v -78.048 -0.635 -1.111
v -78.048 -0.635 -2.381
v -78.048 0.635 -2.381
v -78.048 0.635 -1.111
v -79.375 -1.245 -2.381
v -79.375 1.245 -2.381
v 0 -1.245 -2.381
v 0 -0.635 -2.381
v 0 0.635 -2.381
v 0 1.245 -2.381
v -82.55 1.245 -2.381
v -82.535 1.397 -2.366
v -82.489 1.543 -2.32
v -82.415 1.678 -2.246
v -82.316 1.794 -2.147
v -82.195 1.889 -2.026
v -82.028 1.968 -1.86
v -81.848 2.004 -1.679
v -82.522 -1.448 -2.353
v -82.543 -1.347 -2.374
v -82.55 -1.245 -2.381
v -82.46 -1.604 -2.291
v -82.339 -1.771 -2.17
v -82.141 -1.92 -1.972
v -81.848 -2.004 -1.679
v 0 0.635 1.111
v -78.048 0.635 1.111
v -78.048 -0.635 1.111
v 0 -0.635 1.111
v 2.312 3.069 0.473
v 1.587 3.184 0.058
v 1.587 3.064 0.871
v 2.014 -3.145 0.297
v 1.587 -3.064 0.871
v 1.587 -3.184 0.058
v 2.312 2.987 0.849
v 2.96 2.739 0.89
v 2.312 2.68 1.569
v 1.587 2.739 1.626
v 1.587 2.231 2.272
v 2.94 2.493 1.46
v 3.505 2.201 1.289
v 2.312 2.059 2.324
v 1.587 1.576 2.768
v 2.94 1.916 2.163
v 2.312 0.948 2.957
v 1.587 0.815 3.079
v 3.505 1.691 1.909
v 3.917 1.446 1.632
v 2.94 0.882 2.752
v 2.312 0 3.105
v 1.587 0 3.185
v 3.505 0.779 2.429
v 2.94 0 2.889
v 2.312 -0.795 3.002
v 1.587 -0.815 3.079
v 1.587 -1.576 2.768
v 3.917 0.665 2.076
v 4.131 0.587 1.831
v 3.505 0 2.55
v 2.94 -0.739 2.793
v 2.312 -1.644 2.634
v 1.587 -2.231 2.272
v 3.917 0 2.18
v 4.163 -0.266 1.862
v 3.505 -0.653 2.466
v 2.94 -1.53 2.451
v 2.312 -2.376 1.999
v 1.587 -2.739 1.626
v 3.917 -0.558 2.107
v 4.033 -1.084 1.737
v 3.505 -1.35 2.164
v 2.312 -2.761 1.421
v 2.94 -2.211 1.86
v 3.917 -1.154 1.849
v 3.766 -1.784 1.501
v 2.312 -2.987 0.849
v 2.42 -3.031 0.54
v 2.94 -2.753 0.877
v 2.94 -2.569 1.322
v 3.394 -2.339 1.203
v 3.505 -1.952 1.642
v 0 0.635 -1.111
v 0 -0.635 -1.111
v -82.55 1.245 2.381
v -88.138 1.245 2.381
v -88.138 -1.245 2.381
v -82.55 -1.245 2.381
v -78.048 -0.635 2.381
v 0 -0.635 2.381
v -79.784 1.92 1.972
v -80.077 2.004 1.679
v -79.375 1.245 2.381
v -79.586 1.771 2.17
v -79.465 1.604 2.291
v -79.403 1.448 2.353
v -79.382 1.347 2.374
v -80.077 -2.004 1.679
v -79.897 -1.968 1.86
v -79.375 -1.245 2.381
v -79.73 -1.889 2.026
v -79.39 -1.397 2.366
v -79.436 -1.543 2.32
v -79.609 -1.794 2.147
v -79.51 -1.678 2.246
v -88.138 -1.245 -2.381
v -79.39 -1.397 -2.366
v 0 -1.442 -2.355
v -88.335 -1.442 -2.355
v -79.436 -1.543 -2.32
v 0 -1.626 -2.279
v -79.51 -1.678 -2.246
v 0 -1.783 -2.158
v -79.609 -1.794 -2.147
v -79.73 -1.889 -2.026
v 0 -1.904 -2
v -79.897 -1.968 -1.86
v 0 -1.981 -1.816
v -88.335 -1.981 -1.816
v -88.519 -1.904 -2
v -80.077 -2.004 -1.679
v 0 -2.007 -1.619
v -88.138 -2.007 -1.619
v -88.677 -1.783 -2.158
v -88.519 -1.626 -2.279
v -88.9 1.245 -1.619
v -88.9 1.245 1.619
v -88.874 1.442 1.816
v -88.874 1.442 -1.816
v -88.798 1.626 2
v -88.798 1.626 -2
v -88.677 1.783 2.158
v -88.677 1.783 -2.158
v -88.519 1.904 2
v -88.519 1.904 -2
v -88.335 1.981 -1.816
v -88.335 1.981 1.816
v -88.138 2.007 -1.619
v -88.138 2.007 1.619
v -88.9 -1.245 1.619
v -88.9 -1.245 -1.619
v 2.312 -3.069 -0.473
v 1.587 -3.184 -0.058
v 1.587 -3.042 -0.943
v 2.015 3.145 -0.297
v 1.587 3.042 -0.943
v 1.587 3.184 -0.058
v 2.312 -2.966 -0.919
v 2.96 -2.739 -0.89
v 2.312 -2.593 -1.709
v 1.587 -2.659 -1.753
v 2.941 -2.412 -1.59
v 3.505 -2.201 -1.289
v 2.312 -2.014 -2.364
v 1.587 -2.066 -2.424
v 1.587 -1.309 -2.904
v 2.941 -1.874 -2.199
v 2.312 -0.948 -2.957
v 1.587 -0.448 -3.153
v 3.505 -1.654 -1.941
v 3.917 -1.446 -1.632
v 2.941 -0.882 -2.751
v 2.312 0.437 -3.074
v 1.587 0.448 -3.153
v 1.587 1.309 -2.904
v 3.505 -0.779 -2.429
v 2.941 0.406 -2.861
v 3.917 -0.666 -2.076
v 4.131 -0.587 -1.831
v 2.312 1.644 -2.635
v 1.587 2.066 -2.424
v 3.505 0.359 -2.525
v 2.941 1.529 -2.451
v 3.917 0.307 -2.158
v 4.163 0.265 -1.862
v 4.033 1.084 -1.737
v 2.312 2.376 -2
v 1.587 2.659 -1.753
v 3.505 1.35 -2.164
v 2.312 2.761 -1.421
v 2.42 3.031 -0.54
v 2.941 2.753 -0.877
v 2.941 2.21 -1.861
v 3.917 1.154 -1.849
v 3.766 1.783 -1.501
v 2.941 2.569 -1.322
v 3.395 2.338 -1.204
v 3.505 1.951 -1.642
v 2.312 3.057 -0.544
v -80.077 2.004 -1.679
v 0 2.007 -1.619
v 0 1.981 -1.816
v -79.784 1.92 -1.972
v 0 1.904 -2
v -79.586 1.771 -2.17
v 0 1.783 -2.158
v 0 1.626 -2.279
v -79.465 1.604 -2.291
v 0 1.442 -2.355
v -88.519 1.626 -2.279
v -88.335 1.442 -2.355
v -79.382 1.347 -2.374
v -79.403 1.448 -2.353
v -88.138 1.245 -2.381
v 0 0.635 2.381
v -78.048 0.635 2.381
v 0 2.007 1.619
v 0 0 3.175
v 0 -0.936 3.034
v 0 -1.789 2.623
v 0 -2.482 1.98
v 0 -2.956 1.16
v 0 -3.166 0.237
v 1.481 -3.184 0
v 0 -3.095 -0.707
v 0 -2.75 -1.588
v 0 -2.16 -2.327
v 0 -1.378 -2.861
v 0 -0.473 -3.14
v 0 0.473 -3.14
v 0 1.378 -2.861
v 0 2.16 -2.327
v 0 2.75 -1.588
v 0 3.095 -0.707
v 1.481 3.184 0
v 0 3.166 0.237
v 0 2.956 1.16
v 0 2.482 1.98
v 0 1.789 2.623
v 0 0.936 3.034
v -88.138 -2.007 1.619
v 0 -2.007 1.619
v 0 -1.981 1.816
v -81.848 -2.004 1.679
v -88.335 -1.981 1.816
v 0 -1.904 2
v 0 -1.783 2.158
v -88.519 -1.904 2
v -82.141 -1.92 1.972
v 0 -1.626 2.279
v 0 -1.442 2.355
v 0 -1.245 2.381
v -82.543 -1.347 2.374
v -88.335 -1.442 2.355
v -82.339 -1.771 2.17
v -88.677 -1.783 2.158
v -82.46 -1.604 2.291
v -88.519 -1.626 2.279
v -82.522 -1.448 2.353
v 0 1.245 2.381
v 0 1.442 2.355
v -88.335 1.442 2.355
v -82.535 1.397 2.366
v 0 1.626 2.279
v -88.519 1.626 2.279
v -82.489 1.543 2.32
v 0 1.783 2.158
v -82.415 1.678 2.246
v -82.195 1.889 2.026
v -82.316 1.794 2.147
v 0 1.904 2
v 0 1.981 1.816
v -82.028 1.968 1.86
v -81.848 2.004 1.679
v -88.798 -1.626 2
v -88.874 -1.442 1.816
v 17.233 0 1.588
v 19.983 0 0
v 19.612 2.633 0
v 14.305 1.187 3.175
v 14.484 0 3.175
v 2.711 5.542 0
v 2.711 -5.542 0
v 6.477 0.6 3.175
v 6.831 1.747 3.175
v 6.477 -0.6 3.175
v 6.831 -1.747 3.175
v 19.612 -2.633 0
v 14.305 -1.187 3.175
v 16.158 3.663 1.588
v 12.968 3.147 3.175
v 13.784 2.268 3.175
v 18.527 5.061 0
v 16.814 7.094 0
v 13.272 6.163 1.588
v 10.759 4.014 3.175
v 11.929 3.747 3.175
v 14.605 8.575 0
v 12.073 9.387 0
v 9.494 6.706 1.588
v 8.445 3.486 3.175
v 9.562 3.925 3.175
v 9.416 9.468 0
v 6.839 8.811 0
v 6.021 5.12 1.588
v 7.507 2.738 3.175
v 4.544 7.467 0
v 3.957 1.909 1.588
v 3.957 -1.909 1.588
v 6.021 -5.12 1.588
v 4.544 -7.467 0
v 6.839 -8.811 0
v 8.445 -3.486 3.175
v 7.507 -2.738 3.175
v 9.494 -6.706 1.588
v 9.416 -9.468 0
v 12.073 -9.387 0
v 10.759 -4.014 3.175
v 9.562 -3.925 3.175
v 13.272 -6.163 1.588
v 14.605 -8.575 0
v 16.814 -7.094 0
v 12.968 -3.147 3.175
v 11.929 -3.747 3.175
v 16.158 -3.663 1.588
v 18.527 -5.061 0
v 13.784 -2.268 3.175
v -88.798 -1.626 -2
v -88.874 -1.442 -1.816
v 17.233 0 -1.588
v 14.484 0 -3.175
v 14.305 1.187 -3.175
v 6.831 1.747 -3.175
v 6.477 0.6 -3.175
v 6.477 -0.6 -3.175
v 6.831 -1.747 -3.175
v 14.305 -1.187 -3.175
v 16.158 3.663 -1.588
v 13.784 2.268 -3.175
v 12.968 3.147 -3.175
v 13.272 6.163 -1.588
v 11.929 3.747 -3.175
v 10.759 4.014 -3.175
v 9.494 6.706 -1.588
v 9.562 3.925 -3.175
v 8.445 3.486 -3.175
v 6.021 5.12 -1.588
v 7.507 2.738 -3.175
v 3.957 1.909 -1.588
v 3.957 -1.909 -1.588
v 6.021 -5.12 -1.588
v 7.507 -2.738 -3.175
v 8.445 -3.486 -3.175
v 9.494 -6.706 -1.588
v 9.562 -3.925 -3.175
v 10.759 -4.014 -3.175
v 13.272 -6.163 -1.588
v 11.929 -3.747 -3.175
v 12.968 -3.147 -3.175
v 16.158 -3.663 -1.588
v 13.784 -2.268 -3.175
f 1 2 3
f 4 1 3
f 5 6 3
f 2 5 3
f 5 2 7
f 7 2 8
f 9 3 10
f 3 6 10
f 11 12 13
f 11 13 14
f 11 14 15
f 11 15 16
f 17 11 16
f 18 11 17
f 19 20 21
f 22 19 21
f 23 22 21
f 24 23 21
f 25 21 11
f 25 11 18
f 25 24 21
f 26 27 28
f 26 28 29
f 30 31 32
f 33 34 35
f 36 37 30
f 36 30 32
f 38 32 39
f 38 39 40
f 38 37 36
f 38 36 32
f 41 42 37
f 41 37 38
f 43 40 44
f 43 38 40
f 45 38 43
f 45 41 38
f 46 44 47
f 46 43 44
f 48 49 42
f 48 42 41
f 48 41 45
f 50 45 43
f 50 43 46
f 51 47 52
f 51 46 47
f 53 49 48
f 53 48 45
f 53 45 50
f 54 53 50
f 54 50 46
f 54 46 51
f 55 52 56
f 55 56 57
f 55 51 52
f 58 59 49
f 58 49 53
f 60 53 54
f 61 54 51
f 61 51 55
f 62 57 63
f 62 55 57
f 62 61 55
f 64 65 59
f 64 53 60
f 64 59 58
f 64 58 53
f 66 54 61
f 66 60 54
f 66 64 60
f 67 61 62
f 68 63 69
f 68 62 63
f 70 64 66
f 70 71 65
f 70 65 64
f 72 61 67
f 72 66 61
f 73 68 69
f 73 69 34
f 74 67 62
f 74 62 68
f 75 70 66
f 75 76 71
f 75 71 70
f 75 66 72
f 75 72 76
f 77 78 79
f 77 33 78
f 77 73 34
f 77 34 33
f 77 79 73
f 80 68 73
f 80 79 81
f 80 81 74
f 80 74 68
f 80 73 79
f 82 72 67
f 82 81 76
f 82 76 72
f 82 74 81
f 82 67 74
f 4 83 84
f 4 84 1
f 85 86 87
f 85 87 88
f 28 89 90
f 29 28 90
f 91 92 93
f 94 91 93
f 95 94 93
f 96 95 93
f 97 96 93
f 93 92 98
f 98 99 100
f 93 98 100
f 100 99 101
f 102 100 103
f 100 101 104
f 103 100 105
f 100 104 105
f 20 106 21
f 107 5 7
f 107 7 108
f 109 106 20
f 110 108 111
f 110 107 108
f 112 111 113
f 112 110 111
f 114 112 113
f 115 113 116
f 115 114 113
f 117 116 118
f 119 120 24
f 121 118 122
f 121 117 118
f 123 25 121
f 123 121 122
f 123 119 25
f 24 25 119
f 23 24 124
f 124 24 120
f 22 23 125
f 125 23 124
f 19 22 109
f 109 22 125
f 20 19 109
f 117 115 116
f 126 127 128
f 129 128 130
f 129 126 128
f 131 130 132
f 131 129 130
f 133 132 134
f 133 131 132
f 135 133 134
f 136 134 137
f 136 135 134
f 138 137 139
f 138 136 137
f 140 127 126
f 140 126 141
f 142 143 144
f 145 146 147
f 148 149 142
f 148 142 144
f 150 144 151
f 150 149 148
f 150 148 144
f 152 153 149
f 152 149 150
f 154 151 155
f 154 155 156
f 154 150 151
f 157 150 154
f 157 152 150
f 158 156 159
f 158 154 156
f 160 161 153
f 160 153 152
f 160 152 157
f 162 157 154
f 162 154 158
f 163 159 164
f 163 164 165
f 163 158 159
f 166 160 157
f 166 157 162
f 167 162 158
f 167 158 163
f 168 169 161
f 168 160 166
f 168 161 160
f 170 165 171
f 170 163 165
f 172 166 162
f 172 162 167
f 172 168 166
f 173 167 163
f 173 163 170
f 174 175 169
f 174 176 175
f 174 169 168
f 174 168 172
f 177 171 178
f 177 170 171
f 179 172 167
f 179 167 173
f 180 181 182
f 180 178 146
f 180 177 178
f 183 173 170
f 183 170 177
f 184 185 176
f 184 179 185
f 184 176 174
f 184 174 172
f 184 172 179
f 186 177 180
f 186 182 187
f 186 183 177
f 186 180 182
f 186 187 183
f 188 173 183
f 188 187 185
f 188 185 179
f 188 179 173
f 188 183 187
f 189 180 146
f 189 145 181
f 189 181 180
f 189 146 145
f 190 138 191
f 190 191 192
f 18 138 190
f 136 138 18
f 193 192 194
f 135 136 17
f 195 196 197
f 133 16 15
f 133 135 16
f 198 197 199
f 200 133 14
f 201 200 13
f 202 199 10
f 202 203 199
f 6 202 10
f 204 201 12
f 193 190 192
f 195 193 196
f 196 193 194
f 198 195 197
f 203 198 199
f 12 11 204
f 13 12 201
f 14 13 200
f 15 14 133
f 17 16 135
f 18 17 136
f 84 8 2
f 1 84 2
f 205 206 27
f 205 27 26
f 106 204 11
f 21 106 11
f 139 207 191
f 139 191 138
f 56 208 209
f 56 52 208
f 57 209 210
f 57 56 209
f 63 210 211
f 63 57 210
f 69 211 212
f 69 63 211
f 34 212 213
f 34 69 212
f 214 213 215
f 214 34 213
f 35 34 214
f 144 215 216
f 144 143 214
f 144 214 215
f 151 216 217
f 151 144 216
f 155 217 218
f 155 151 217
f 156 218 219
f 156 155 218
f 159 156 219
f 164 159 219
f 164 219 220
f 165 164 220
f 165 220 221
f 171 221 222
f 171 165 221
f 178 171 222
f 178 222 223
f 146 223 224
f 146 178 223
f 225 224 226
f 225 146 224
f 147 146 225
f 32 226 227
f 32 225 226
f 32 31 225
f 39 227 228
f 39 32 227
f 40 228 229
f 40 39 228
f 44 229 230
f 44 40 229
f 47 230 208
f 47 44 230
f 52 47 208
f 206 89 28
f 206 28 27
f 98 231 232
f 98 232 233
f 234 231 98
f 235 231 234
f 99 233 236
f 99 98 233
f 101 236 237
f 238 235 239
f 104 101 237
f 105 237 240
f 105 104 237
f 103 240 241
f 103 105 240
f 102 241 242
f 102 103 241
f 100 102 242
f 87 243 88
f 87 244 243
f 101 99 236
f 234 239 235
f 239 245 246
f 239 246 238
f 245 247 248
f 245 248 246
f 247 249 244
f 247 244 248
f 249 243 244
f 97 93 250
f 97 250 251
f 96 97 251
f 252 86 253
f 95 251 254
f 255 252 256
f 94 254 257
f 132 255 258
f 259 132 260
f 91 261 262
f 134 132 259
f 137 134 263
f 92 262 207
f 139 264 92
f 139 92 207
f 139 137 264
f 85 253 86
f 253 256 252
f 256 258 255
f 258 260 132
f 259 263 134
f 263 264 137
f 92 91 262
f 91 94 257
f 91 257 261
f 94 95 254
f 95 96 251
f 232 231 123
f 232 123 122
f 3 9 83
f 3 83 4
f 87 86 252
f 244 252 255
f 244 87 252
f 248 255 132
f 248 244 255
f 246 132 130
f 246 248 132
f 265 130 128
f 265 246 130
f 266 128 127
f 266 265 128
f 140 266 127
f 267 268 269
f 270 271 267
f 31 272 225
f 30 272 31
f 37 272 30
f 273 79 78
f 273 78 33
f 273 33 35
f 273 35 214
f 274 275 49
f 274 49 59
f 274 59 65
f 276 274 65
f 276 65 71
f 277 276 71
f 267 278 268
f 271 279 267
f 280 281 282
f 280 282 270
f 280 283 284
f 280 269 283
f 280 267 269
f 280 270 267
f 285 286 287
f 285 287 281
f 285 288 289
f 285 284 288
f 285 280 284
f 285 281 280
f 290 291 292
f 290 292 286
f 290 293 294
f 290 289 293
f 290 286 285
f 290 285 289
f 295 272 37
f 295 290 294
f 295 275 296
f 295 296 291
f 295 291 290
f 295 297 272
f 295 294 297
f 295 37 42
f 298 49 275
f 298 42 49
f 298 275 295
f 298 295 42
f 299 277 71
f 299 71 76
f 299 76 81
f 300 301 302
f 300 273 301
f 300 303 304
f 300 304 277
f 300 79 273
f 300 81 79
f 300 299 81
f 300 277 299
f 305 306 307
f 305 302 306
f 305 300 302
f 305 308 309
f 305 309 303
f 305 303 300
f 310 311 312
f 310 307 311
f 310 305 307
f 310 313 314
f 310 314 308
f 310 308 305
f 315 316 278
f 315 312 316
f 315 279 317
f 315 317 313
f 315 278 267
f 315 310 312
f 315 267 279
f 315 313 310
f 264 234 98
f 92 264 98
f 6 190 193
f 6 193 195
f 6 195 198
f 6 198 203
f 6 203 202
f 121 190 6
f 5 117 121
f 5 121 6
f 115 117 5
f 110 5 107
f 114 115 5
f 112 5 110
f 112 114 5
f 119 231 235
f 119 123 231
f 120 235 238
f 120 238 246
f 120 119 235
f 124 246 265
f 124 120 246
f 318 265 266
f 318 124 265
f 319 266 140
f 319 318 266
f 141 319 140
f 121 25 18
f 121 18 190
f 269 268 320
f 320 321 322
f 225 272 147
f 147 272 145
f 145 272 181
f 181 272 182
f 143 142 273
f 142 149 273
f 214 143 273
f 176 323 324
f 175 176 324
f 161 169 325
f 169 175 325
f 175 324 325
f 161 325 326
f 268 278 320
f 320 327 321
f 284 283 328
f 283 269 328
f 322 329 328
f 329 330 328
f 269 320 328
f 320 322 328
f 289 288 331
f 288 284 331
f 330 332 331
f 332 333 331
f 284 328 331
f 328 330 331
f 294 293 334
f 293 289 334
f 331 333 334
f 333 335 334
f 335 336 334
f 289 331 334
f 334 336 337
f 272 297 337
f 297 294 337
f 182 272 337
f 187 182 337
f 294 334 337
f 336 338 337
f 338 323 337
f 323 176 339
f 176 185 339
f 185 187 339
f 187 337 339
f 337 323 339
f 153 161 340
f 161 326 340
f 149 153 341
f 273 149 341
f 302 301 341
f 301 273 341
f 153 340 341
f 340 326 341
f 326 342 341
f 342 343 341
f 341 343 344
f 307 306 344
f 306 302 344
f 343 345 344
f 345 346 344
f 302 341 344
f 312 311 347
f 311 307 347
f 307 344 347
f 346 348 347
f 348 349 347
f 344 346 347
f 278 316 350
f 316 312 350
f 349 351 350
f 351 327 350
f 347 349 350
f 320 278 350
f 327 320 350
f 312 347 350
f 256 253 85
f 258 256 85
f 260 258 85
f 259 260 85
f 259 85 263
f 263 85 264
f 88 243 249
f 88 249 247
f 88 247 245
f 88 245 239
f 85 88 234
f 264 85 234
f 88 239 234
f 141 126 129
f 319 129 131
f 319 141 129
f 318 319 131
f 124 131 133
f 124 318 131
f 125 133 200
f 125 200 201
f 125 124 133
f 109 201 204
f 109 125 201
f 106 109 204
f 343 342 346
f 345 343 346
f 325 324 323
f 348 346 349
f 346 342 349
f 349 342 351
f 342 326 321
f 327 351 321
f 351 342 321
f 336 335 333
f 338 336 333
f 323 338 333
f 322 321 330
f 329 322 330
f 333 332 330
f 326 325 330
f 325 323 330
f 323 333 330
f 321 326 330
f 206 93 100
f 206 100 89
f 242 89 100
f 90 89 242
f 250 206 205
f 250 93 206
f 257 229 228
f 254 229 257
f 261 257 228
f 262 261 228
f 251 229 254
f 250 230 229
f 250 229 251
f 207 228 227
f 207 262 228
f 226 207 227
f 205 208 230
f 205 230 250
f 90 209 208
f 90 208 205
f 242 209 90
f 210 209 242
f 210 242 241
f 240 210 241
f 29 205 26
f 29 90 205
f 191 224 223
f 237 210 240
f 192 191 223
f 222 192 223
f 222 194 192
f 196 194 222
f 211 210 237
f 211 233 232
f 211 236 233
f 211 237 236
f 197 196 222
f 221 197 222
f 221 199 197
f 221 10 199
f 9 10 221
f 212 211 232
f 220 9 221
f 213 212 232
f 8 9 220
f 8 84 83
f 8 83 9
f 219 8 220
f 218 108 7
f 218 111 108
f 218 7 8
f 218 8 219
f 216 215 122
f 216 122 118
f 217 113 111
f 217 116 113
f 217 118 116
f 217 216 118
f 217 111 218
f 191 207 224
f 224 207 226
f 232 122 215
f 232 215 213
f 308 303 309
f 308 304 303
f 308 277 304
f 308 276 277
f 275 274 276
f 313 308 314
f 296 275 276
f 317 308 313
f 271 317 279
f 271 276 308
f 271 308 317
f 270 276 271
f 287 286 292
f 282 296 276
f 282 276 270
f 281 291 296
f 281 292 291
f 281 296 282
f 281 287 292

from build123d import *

# Parameters (mm, degrees)
SKETCH2_R                     = 9.525
BOSS_EXTRUDE1_DEPTH           = 3.175
BOSS_EXTRUDE1_TAPER           = 60
BOSS_EXTRUDE1_OTHER_WAY_DEPTH = 3.175
BOSS_EXTRUDE1_OTHER_WAY_TAPER = 60
BOSS_EXTRUDE2_DEPTH           = 2.38125
CUT_EXTRUDE1_DEPTH            = 90.465522276
CUT_EXTRUDE1_DEPTH_BACK       = 90.465522276
SKETCH5_W                     = 78.047666622
SKETCH5_H                     = 1.27
CUT_EXTRUDE2_DEPTH            = 1.27
SKETCH6_W                     = 78.047666622
SKETCH6_H                     = 1.27
CUT_EXTRUDE3_DEPTH            = 1.27
FILLET1_START                 = -88.9
FILLET1_DEPTH                 = 88.9
FILLET1_START_2               = -2.38125
FILLET1_2_DEPTH               = 4.7625
FILLET1_START_3               = -2.006559914
FILLET1_3_DEPTH               = 4.013119828


with BuildPart() as part:
    # Sketch1 → Revolve1 (revolve)
    with BuildSketch(Plane.XY, mode=Mode.PRIVATE) as revolve1_sk:
        with BuildLine():
            Line((0, 0), (0, 3.175))
            Line((0, 3.175), (1.587469063, 3.18491082))
            ThreePointArc((1.587469063, 3.18491082), (3.841885865, 2.257287955), (4.7625, 0))
            Line((4.7625, 0), (3.175, 0))
            Line((3.175, 0), (0, 0))
        make_face()
    revolve(revolve1_sk.sketch.rotate(Axis((-88.99, 0, 0), (1, 0, 0)), 90), axis=Axis((-88.99, 0, 0), (1, 0, 0)))

    # Sketch2 → Boss-Extrude1 (add)
    with BuildSketch(Plane.XY):
        with Locations((10.457777384, 0)):
            Circle(SKETCH2_R)
    extrude(amount=BOSS_EXTRUDE1_DEPTH, taper=BOSS_EXTRUDE1_TAPER)

    # Sketch2 → Boss-Extrude1 other way (add)
    with BuildSketch(Plane.XY):
        with Locations((10.457777384, 0)):
            Circle(SKETCH2_R)
    extrude(amount=-BOSS_EXTRUDE1_OTHER_WAY_DEPTH, taper=BOSS_EXTRUDE1_OTHER_WAY_TAPER)

    # Sketch3 → Boss-Extrude2 (add, symmetric)
    with BuildSketch(Plane.XY):
        Polygon((0, 2.006559914), (-88.9, 2.006559914), (-88.9, 0), (-88.9, -2.006559914), (0, -2.006559914), (0, 0), align=None)
    extrude(amount=BOSS_EXTRUDE2_DEPTH, both=True)

    # Sketch4 → Cut-Extrude1 (cut, two sides: drawn at the far end of the back side and taken through both)
    with BuildSketch(Plane(origin=(0, 0, 0), x_dir=(1, 0, 0), z_dir=(0, 1, 0)).offset(-CUT_EXTRUDE1_DEPTH_BACK)):
        Polygon((-82.55, 2.38125), (-81.847582607, 1.678832607), (-80.077417393, 1.678832607), (-79.375, 2.38125), align=None)
        Polygon((-80.077417393, -1.678832607), (-79.375, -2.38125), (-82.55, -2.38125), (-81.847582607, -1.678832607), align=None)
    extrude(amount=CUT_EXTRUDE1_DEPTH + CUT_EXTRUDE1_DEPTH_BACK, mode=Mode.SUBTRACT)

    # Sketch5 → Cut-Extrude2 (cut)
    with BuildSketch(Plane.XY.offset(2.38125)):
        with Locations((-39.023833311, 0)):
            Rectangle(SKETCH5_W, SKETCH5_H)
    extrude(amount=-CUT_EXTRUDE2_DEPTH, mode=Mode.SUBTRACT)

    # Sketch6 → Cut-Extrude3 (cut)
    with BuildSketch(Plane(origin=(0, 0, -2.38125), x_dir=(-1, 0, 0), z_dir=(0, 0, -1))):
        with Locations((39.023833311, 0)):
            Rectangle(SKETCH6_W, SKETCH6_H)
    extrude(amount=-CUT_EXTRUDE3_DEPTH, mode=Mode.SUBTRACT)

    # Fillet1: read off the stored shape, not the designer's step
    # Fillet1 outline → Fillet1 (cut)
    with BuildSketch(Plane.YZ.offset(FILLET1_START)):
        with BuildLine():
            Line((-2.006559914, 2.38125), (-2.006559914, 1.61925))
            ThreePointArc((-2.006559914, 1.61925), (-1.783375281, 2.158065367), (-1.244559914, 2.38125))
            Line((-1.244559914, 2.38125), (-2.006559914, 2.38125))
        make_face()
        with BuildLine():
            ThreePointArc((-1.244559914, -2.38125), (-1.783375281, -2.158065367), (-2.006559914, -1.61925))
            Line((-2.006559914, -1.61925), (-2.006559914, -2.38125))
            Line((-2.006559914, -2.38125), (-1.244559914, -2.38125))
        make_face()
        with BuildLine():
            Line((2.006559914, 2.38125), (1.244559914, 2.38125))
            ThreePointArc((1.244559914, 2.38125), (1.783375281, 2.158065367), (2.006559914, 1.61925))
            Line((2.006559914, 1.61925), (2.006559914, 2.38125))
        make_face()
        with BuildLine():
            ThreePointArc((2.006559914, -1.61925), (1.783375281, -2.158065367), (1.244559914, -2.38125))
            Line((1.244559914, -2.38125), (2.006559914, -2.38125))
            Line((2.006559914, -2.38125), (2.006559914, -1.61925))
        make_face()
    extrude(amount=FILLET1_DEPTH, mode=Mode.SUBTRACT)

    # Fillet1 2 outline → Fillet1 2 (cut)
    with BuildSketch(Plane.XY.offset(FILLET1_START_2)):
        with BuildLine():
            Line((-88.9, -2.006559914), (-88.138, -2.006559914))
            ThreePointArc((-88.138, -2.006559914), (-88.676815367, -1.783375281), (-88.9, -1.244559914))
            Line((-88.9, -1.244559914), (-88.9, -2.006559914))
        make_face()
        with BuildLine():
            Line((-88.9, 2.006559914), (-88.9, 1.244559914))
            ThreePointArc((-88.9, 1.244559914), (-88.676815367, 1.783375281), (-88.138, 2.006559914))
            Line((-88.138, 2.006559914), (-88.9, 2.006559914))
        make_face()
    extrude(amount=FILLET1_2_DEPTH, mode=Mode.SUBTRACT)

    # Fillet1 3 outline → Fillet1 3 (cut)
    with BuildSketch(Plane(origin=(0, 0, 0), x_dir=(1, 0, 0), z_dir=(0, 1, 0)).offset(FILLET1_START_3)):
        with BuildLine():
            ThreePointArc((-88.138, -2.38125), (-88.676815367, -2.158065367), (-88.9, -1.61925))
            Line((-88.9, -1.61925), (-88.9, -2.38125))
            Line((-88.9, -2.38125), (-88.138, -2.38125))
        make_face()
        with BuildLine():
            Line((-88.9, 2.38125), (-88.9, 1.61925))
            ThreePointArc((-88.9, 1.61925), (-88.676815367, 2.158065367), (-88.138, 2.38125))
            Line((-88.138, 2.38125), (-88.9, 2.38125))
        make_face()
    extrude(amount=FILLET1_3_DEPTH, mode=Mode.SUBTRACT)


solid = part.part
